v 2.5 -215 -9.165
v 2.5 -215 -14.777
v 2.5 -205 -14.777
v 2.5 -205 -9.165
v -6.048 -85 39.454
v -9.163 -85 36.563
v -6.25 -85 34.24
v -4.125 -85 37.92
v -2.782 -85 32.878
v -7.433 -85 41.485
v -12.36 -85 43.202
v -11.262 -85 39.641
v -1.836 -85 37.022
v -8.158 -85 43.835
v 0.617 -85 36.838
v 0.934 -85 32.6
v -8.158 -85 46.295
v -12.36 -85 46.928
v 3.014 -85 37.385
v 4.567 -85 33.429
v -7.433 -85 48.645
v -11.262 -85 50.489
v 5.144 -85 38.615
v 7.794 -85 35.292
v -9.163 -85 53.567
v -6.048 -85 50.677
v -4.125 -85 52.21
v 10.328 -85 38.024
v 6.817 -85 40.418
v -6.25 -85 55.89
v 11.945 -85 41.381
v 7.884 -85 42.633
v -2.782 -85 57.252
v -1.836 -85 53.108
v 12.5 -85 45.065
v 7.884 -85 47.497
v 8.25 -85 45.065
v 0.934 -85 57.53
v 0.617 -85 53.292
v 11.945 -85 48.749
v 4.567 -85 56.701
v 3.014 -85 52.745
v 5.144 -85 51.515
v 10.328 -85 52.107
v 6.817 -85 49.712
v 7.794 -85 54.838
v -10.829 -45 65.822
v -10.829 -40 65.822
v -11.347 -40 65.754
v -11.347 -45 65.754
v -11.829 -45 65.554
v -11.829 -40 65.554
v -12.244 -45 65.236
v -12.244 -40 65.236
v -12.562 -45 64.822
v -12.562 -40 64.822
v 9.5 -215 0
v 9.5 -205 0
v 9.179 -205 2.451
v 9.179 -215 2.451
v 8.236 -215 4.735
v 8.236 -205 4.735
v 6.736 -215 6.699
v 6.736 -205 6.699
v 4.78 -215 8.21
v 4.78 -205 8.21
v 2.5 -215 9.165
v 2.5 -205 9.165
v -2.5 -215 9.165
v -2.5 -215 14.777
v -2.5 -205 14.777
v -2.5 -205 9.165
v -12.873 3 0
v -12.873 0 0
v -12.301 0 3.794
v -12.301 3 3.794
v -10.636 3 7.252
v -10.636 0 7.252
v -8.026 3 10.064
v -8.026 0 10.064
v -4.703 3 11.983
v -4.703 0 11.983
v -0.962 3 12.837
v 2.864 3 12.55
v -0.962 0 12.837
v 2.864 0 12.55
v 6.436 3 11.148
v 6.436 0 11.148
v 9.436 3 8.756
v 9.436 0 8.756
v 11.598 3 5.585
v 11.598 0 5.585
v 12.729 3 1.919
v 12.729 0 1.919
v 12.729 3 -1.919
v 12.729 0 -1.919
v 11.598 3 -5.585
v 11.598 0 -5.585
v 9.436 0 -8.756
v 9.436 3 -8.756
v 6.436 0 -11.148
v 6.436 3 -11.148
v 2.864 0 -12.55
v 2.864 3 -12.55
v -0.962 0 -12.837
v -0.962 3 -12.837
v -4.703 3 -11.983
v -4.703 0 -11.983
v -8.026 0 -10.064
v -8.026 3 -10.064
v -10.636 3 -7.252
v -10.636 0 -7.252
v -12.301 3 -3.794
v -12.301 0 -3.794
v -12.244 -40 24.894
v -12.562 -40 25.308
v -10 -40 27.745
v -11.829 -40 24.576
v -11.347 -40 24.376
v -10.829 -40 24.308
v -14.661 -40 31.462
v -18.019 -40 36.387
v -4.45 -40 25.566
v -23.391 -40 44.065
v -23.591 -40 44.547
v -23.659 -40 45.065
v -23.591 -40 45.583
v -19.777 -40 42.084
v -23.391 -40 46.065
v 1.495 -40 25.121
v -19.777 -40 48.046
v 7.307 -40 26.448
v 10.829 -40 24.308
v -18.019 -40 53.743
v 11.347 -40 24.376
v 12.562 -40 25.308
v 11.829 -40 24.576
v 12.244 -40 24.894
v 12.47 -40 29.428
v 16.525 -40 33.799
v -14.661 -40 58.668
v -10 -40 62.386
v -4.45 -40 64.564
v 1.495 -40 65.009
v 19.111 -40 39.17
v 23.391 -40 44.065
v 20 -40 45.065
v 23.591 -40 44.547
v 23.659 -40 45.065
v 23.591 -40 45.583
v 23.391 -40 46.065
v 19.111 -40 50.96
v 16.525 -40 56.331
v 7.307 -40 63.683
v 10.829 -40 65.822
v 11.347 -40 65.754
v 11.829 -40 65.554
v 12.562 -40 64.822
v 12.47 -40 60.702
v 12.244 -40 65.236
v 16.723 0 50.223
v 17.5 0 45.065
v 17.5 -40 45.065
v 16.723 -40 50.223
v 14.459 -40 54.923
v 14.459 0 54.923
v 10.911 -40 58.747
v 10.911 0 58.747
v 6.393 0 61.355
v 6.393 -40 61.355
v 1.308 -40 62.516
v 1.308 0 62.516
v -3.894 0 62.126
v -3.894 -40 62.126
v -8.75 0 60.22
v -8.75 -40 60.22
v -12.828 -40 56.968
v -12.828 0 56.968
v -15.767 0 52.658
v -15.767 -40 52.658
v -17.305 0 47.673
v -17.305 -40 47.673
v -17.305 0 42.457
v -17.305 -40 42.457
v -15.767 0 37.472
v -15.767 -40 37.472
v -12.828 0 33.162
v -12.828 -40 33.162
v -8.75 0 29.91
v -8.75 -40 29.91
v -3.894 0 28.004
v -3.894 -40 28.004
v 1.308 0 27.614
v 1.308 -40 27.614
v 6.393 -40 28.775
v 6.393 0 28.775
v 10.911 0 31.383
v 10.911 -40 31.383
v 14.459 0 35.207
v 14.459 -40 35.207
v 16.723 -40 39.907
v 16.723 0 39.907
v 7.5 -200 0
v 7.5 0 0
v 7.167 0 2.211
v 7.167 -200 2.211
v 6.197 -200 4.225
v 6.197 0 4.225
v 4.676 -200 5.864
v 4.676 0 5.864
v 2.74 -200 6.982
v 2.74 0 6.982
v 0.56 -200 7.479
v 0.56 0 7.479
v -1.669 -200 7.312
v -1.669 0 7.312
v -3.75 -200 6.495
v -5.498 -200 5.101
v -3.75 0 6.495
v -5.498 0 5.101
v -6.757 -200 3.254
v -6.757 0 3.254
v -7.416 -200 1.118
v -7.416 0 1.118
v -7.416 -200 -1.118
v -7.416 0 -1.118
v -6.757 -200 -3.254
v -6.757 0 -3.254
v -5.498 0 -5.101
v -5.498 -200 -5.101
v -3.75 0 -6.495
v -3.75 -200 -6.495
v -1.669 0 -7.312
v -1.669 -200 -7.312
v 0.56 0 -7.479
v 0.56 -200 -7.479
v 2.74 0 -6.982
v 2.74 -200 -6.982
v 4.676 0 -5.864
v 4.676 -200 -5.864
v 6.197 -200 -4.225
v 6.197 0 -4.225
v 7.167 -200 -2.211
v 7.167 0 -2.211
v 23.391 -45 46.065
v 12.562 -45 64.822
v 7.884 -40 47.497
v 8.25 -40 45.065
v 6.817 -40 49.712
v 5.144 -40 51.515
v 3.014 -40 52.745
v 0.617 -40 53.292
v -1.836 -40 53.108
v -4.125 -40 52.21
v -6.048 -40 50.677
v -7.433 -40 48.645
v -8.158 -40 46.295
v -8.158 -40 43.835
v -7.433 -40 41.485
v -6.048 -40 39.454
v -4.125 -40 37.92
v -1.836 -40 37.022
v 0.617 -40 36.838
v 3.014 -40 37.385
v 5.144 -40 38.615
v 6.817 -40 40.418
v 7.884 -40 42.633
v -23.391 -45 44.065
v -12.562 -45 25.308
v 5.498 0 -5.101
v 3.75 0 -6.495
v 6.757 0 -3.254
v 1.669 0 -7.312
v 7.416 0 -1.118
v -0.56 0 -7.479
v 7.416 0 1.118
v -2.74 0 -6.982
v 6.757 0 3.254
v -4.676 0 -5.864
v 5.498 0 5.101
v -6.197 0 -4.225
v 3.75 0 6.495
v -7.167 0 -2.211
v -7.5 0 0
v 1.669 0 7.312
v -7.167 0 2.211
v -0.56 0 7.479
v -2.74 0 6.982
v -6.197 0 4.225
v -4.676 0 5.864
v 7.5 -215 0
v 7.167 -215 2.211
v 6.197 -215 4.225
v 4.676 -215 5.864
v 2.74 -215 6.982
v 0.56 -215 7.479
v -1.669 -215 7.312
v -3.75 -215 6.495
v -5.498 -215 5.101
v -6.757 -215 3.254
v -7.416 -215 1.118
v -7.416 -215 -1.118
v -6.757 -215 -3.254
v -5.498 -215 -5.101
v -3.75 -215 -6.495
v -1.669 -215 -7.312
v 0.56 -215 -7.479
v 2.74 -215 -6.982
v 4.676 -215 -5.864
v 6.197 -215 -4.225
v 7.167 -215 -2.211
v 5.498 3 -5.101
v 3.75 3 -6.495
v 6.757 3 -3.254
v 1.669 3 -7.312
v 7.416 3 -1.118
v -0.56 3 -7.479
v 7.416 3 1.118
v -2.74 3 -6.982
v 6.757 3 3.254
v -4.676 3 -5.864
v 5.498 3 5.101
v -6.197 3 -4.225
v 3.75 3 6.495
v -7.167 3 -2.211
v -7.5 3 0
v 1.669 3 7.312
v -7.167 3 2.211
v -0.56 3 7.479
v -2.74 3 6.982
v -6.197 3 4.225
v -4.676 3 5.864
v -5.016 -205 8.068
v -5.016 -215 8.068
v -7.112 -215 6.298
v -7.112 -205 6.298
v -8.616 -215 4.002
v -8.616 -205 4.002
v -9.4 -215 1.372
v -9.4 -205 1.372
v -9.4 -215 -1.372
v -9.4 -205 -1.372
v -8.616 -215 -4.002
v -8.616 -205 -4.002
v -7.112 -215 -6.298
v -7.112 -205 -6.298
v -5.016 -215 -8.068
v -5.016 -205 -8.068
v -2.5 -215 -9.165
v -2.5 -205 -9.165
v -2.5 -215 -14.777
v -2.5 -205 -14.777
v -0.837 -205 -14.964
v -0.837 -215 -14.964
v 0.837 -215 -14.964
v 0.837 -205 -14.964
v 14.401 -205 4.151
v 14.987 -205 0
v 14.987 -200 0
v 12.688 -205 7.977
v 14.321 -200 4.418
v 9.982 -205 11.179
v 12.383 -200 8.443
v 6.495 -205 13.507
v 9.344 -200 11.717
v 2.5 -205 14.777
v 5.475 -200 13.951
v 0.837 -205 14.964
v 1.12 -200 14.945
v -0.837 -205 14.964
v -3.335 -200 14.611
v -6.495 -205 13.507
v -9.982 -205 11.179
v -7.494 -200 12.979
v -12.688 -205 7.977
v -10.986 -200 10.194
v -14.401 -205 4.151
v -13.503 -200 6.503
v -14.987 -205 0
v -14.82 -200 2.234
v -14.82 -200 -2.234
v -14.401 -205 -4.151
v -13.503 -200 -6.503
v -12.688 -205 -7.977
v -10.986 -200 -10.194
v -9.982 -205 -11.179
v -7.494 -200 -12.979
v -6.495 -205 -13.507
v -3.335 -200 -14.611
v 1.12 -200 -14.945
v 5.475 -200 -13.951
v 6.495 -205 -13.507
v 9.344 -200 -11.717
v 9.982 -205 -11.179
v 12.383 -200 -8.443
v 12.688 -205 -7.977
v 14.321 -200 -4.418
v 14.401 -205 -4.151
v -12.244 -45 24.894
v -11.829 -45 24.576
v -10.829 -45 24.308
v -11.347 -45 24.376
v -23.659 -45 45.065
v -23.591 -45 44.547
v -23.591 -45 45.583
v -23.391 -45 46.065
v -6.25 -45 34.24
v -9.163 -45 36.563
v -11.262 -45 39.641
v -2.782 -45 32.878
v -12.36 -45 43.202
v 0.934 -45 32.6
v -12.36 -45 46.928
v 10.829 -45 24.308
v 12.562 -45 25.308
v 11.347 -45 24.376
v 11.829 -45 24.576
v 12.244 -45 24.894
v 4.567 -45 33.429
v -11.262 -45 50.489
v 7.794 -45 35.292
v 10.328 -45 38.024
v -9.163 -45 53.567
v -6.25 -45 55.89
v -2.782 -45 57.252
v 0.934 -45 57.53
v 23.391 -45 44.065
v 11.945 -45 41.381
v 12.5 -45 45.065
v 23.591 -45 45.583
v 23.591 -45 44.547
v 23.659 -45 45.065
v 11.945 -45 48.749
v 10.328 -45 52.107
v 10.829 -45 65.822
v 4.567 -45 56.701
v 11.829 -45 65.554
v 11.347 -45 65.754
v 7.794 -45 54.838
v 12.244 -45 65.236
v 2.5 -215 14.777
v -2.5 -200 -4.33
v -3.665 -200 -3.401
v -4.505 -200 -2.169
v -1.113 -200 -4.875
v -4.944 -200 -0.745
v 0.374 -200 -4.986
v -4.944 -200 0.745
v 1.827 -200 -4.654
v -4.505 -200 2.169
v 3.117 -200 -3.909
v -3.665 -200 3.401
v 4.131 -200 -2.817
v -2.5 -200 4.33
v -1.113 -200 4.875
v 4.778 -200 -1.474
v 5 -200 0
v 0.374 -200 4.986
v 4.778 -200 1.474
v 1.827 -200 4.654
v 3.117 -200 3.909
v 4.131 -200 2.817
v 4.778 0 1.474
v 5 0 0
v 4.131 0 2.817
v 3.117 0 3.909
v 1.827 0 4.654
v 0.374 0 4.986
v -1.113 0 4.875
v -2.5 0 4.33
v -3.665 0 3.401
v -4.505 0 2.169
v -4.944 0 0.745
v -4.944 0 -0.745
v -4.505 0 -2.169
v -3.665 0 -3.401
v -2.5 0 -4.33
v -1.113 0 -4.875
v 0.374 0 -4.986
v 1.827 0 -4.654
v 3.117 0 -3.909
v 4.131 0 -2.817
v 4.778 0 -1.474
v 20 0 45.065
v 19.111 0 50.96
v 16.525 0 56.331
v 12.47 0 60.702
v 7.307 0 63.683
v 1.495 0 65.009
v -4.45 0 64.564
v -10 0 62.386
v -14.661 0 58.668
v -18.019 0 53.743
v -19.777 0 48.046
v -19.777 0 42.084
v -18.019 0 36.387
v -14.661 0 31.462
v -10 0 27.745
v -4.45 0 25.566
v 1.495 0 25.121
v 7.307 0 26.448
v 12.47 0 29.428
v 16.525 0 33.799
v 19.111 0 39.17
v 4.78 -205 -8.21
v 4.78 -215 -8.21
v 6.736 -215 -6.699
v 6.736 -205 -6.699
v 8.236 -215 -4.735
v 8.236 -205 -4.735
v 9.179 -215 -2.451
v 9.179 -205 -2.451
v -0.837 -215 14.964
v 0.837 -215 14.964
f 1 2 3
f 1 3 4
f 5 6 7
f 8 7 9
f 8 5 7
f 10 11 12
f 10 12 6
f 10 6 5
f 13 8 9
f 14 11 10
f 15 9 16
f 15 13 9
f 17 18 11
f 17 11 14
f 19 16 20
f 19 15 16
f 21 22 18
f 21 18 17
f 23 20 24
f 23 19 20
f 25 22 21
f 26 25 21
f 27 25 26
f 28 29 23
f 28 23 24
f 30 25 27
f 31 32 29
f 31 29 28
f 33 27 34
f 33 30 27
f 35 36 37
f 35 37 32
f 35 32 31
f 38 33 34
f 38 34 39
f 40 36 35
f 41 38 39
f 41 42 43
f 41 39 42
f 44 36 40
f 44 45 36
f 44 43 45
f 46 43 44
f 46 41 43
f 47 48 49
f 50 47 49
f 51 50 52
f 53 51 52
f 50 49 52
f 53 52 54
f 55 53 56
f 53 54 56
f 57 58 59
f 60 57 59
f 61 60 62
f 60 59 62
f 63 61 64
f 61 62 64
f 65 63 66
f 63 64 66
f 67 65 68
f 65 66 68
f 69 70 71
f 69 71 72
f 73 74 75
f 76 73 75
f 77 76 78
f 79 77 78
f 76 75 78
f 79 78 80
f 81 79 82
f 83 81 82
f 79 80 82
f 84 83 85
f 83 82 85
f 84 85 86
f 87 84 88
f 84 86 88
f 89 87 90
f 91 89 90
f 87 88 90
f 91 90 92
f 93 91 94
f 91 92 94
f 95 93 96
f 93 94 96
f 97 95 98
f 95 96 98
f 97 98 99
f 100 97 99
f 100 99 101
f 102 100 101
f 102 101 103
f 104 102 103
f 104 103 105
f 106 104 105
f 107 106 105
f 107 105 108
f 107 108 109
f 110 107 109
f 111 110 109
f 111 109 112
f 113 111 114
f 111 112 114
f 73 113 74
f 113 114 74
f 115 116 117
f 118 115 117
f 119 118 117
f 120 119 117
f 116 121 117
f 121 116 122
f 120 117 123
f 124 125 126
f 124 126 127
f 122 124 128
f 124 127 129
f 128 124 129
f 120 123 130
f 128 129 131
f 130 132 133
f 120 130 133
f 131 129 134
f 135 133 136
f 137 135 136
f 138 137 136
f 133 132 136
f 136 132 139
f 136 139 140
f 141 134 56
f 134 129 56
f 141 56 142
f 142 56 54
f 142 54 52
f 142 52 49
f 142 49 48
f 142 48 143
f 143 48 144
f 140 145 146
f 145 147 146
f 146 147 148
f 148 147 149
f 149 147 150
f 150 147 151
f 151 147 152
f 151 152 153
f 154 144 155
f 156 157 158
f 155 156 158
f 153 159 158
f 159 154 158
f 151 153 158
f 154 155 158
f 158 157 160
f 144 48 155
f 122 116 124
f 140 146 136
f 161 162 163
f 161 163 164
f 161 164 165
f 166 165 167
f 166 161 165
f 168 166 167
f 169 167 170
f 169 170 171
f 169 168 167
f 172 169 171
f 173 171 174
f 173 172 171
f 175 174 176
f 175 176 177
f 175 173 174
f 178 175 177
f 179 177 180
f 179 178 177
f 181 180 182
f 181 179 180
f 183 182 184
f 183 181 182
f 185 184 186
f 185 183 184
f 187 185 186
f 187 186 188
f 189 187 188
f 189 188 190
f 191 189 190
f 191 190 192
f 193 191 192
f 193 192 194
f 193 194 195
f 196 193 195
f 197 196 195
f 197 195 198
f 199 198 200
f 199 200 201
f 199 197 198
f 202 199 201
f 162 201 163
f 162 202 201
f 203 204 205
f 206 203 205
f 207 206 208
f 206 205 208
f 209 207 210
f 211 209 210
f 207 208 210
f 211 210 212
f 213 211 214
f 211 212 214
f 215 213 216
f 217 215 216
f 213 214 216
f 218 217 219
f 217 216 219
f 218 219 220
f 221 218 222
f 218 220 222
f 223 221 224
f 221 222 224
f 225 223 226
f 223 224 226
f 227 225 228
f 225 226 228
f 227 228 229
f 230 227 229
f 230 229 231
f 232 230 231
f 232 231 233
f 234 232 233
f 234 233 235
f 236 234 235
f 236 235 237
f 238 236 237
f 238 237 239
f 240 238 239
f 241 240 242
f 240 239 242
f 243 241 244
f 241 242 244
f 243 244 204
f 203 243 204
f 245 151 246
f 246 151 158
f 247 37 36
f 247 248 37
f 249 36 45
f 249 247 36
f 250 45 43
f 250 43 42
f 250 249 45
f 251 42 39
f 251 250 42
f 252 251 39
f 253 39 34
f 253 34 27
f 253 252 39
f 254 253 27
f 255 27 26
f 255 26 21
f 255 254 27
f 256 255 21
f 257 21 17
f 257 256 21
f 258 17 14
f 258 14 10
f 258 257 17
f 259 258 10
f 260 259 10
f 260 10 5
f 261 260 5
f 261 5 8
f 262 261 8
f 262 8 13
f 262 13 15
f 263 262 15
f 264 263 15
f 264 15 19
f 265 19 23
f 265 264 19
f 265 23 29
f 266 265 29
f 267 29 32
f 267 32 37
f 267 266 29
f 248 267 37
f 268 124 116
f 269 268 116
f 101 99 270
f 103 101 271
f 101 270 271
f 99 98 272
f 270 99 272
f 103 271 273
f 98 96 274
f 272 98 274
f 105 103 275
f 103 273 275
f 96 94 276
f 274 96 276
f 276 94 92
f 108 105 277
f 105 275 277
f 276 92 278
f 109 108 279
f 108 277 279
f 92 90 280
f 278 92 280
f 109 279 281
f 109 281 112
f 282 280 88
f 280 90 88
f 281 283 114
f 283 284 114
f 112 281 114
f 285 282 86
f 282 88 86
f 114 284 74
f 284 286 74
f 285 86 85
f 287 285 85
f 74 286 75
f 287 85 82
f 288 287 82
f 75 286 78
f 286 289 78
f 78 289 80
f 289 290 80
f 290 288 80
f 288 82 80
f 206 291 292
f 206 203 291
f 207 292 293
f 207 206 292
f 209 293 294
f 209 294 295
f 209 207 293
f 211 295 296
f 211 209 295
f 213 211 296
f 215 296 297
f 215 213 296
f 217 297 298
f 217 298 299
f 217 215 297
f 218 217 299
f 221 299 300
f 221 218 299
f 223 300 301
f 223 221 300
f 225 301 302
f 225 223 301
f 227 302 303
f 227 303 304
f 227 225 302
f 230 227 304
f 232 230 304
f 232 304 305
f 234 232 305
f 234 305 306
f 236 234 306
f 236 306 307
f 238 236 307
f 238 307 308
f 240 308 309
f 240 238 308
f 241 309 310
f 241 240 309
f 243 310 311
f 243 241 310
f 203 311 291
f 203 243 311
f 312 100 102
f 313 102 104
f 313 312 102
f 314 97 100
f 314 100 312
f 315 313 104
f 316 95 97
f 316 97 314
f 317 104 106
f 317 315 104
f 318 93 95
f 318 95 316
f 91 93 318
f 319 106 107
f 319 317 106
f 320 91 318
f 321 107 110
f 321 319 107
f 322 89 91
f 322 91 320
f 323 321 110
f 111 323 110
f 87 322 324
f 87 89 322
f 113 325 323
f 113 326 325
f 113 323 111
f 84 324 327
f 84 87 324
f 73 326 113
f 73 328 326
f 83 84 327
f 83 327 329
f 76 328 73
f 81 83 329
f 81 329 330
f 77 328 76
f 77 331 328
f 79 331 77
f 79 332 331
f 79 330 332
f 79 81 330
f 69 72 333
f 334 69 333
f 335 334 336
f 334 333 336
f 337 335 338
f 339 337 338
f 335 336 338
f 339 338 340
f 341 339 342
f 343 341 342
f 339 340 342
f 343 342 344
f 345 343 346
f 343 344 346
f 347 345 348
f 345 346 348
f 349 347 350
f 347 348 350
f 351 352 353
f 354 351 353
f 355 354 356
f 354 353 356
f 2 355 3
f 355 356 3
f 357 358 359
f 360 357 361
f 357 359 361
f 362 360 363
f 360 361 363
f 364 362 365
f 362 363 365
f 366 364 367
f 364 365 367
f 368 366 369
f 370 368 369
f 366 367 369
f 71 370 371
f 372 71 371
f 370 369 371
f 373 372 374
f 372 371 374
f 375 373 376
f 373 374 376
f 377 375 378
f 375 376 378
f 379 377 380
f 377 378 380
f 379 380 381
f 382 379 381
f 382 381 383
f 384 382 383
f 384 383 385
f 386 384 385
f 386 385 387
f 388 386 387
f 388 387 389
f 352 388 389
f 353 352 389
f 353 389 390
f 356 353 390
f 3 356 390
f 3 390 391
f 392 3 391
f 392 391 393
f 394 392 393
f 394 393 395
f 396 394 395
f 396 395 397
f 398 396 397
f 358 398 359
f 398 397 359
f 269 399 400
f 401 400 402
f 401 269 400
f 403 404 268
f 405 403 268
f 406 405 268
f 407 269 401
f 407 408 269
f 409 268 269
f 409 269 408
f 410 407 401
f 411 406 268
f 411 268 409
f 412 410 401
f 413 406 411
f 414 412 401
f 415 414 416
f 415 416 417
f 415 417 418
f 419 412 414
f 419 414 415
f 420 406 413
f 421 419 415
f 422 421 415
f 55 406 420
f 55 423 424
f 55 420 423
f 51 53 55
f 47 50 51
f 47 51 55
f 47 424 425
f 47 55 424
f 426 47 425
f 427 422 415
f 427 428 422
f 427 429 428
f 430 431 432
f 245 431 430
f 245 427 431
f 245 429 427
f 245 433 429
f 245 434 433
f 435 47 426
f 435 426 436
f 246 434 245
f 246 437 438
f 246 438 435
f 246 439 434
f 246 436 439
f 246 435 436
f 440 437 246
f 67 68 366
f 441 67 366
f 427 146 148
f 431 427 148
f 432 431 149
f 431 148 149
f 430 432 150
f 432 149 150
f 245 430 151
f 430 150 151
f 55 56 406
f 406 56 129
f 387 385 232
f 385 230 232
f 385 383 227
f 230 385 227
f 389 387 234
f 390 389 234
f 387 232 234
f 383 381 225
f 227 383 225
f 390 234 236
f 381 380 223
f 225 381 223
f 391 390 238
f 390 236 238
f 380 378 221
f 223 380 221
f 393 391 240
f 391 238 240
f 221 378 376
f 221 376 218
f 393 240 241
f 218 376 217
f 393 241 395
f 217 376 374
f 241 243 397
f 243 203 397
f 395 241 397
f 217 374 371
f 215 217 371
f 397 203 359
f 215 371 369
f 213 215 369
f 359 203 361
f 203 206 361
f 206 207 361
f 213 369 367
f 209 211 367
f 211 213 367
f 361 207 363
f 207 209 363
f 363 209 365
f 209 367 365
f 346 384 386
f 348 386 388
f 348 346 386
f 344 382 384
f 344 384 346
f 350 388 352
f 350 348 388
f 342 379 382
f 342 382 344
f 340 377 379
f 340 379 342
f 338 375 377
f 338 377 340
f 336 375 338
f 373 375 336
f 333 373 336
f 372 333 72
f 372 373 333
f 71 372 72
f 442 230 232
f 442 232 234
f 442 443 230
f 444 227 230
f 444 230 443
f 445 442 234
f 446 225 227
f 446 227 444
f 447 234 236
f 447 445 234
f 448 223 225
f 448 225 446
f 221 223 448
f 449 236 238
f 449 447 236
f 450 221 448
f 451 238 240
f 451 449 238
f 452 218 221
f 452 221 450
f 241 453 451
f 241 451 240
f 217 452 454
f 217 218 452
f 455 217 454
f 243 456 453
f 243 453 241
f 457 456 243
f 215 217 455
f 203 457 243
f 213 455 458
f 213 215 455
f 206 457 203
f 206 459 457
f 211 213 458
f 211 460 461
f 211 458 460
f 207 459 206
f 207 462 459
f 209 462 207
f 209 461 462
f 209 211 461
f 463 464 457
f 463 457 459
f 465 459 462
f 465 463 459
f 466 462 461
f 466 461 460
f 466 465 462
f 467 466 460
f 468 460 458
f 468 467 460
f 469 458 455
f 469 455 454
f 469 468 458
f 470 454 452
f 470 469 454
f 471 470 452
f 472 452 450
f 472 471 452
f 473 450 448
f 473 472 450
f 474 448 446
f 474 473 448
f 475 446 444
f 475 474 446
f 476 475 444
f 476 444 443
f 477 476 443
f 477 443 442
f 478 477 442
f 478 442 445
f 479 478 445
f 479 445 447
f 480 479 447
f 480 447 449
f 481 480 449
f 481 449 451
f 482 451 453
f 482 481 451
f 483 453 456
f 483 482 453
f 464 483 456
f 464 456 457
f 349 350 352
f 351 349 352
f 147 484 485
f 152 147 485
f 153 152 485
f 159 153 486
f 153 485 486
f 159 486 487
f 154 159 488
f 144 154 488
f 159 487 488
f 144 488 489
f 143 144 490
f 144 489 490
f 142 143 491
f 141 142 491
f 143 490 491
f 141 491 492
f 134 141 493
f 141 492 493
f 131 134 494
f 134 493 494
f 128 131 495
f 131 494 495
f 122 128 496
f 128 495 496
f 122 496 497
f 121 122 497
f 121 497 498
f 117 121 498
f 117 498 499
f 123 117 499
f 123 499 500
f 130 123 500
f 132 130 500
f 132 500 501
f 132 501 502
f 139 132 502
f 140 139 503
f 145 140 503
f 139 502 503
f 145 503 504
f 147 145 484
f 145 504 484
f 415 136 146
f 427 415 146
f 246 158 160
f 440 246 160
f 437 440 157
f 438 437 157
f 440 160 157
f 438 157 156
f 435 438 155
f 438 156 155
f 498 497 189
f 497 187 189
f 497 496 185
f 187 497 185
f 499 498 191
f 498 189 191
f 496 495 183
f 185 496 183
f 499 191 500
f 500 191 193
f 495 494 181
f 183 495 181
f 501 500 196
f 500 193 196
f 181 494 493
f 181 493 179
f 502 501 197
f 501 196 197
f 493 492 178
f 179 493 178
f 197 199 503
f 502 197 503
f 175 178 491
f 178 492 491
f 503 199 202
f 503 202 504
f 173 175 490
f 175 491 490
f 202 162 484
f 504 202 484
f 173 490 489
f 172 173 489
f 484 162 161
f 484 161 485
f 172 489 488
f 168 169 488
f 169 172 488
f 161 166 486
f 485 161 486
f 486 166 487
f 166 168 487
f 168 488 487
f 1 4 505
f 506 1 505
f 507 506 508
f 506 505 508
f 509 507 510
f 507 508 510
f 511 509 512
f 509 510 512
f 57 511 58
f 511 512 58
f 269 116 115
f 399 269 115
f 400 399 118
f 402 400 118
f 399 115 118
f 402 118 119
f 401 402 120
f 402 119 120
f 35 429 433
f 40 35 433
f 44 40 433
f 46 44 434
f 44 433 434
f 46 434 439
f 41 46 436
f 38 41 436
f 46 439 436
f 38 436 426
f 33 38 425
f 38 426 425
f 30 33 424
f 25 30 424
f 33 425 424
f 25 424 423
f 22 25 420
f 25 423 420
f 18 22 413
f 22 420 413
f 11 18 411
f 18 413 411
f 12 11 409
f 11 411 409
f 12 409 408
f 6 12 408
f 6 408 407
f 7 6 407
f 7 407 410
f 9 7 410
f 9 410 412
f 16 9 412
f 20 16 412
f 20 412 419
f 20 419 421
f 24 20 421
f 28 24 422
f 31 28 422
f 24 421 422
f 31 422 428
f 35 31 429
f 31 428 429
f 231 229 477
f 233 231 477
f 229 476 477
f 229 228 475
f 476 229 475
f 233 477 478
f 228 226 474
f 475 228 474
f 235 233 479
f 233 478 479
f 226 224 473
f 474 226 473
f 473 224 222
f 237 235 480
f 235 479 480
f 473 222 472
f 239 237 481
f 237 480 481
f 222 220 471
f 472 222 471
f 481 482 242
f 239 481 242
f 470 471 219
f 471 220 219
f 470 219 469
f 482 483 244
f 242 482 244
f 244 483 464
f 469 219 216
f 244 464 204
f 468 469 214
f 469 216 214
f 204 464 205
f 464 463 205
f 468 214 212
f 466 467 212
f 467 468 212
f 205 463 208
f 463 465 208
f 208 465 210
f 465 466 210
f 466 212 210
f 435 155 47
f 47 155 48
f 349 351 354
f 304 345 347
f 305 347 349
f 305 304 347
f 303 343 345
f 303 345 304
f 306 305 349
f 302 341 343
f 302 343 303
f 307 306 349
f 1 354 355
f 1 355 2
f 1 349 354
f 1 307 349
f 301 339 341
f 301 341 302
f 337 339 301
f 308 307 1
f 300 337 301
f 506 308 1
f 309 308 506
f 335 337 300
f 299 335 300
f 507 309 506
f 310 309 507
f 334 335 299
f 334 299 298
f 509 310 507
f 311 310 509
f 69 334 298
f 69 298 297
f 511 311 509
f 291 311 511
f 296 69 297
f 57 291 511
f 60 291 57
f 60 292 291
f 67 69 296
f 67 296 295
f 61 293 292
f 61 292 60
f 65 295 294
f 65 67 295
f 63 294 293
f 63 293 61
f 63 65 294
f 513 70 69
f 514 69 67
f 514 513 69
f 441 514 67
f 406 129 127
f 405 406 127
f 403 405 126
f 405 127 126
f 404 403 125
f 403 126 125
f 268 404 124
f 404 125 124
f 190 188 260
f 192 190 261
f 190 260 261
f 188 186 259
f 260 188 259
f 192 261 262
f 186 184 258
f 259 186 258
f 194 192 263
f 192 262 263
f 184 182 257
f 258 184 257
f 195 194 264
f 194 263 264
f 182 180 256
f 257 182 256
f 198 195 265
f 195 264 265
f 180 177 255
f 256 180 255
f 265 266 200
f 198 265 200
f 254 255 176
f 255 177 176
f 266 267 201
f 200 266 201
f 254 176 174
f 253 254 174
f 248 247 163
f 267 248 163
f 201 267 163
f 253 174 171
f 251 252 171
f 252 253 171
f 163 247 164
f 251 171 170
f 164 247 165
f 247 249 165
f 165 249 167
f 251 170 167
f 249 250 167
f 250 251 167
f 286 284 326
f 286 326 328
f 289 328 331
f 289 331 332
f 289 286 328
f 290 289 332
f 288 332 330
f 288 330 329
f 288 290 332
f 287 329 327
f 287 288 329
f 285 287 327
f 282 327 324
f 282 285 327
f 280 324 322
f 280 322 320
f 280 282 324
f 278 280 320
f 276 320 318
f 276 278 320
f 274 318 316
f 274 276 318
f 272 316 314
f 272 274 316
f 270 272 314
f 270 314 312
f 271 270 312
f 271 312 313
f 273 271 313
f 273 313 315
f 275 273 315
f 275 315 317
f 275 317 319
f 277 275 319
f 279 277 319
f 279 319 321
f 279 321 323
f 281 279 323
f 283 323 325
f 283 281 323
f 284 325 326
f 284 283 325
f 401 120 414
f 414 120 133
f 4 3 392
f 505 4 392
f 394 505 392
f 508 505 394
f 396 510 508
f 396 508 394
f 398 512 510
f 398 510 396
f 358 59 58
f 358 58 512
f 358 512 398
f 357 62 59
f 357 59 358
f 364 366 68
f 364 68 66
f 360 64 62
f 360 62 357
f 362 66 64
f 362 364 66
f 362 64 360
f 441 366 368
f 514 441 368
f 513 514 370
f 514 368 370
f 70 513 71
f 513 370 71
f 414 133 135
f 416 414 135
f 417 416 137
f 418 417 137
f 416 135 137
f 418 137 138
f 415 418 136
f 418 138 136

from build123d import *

# Parameters (mm, degrees)
F0_R      = 7.5
F0_R_2    = 5
F1_DEPTH  = 200
F2_R      = 14.987167
F2_R_2    = 7.5
F3_DEPTH  = 5
F4_R      = 7.5
F5_DEPTH  = 10
F6_R      = 20
F6_R_2    = 17.5
F7_DEPTH  = 40
F8_R      = 8.250091
F9_DEPTH  = 5
F10_R     = 12.5
F10_R_2   = 8.250091
F11_DEPTH = 40
F12_R     = 12.872863
F12_R_2   = 7.5
F13_DEPTH = 3


with BuildPart() as f1:
    # F0 (on Front) → F1 (new body)
    with BuildSketch(Plane.XZ):
        Circle(F0_R)
        Circle(F0_R_2, mode=Mode.SUBTRACT)
    extrude(amount=F1_DEPTH)


with BuildPart() as f3:
    # F2 (on face) → F3 (new body)
    with BuildSketch(Plane.XZ.offset(200)):
        Circle(F2_R)
        Circle(F2_R_2, mode=Mode.SUBTRACT)
    extrude(amount=F3_DEPTH)

    # F4 (on face) → F5 (join)
    with BuildSketch(Plane.XZ.offset(205)):
        with BuildLine():
            Line((2.5, 9.165151), (2.5, 14.777184))
            ThreePointArc((2.5, 14.777184), (0, 14.987167), (-2.5, 14.777184))
            Line((-2.5, 14.777184), (-2.5, 9.165151))
            ThreePointArc((-2.5, 9.165151), (0, 9.5), (2.5, 9.165151))
        make_face()
        with BuildLine():
            ThreePointArc((-2.5, -14.777184), (0, -14.987167), (2.5, -14.777184))
            Line((2.5, -14.777184), (2.5, -9.165151))
            ThreePointArc((2.5, -9.165151), (0, -9.5), (-2.5, -9.165151))
            Line((-2.5, -9.165151), (-2.5, -14.777184))
        make_face()
        with BuildLine():
            ThreePointArc((9.5, 0), (7.549834, 5.766281), (2.5, 9.165151))
            ThreePointArc((2.5, 9.165151), (0, 9.5), (-2.5, 9.165151))
            ThreePointArc((-2.5, 9.165151), (-9.5, 0), (-2.5, -9.165151))
            ThreePointArc((-2.5, -9.165151), (0, -9.5), (2.5, -9.165151))
            ThreePointArc((2.5, -9.165151), (7.549834, -5.766281), (9.5, 0))
        make_face()
        Circle(F4_R, mode=Mode.SUBTRACT)
    extrude(amount=F5_DEPTH)


with BuildPart() as f7:
    # F6 (on Front) → F7 (new body)
    with BuildSketch(Plane.XZ):
        with Locations((0, 45.065034)):
            Circle(F6_R)
        with Locations((0, 45.065034)):
            Circle(F6_R_2, mode=Mode.SUBTRACT)
    extrude(amount=F7_DEPTH)

    # F8 (on face) → F9 (join)
    with BuildSketch(Plane.XZ.offset(40)):
        with BuildLine():
            Line((10.829489, 65.822259), (-10.829489, 65.822259))
            ThreePointArc((-10.829489, 65.822259), (-11.829489, 65.554309), (-12.561539, 64.822259))
            Line((-12.561539, 64.822259), (-23.391028, 46.065034))
            ThreePointArc((-23.391028, 46.065034), (-23.658977, 45.065034), (-23.391028, 44.065034))
            Line((-23.391028, 44.065034), (-12.561539, 25.30781))
            ThreePointArc((-12.561539, 25.30781), (-11.829489, 24.575759), (-10.829489, 24.30781))
            Line((-10.829489, 24.30781), (10.829489, 24.30781))
            ThreePointArc((10.829489, 24.30781), (11.829489, 24.575759), (12.561539, 25.30781))
            Line((12.561539, 25.30781), (23.391028, 44.065034))
            ThreePointArc((23.391028, 44.065034), (23.658977, 45.065034), (23.391028, 46.065034))
            Line((23.391028, 46.065034), (12.561539, 64.822259))
            ThreePointArc((12.561539, 64.822259), (11.829489, 65.554309), (10.829489, 65.822259))
        make_face()
        with Locations((0, 45.065034)):
            Circle(F8_R, mode=Mode.SUBTRACT)
    extrude(amount=F9_DEPTH)

    # F10 (on face) → F11 (join)
    with BuildSketch(Plane.XZ.offset(45)):
        with Locations((0, 45.065034)):
            Circle(F10_R)
        with Locations((0, 45.065034)):
            Circle(F10_R_2, mode=Mode.SUBTRACT)
    extrude(amount=F11_DEPTH)


with BuildPart() as f13:
    # F12 (on face) → F13 (new body)
    with BuildSketch(Plane(origin=(0, 0, 0), x_dir=(-1, 0, 0), z_dir=(0, 1, 0))):
        Circle(F12_R)
        Circle(F12_R_2, mode=Mode.SUBTRACT)
    extrude(amount=F13_DEPTH)


solid = Compound([f1.part, f3.part, f7.part, f13.part])
